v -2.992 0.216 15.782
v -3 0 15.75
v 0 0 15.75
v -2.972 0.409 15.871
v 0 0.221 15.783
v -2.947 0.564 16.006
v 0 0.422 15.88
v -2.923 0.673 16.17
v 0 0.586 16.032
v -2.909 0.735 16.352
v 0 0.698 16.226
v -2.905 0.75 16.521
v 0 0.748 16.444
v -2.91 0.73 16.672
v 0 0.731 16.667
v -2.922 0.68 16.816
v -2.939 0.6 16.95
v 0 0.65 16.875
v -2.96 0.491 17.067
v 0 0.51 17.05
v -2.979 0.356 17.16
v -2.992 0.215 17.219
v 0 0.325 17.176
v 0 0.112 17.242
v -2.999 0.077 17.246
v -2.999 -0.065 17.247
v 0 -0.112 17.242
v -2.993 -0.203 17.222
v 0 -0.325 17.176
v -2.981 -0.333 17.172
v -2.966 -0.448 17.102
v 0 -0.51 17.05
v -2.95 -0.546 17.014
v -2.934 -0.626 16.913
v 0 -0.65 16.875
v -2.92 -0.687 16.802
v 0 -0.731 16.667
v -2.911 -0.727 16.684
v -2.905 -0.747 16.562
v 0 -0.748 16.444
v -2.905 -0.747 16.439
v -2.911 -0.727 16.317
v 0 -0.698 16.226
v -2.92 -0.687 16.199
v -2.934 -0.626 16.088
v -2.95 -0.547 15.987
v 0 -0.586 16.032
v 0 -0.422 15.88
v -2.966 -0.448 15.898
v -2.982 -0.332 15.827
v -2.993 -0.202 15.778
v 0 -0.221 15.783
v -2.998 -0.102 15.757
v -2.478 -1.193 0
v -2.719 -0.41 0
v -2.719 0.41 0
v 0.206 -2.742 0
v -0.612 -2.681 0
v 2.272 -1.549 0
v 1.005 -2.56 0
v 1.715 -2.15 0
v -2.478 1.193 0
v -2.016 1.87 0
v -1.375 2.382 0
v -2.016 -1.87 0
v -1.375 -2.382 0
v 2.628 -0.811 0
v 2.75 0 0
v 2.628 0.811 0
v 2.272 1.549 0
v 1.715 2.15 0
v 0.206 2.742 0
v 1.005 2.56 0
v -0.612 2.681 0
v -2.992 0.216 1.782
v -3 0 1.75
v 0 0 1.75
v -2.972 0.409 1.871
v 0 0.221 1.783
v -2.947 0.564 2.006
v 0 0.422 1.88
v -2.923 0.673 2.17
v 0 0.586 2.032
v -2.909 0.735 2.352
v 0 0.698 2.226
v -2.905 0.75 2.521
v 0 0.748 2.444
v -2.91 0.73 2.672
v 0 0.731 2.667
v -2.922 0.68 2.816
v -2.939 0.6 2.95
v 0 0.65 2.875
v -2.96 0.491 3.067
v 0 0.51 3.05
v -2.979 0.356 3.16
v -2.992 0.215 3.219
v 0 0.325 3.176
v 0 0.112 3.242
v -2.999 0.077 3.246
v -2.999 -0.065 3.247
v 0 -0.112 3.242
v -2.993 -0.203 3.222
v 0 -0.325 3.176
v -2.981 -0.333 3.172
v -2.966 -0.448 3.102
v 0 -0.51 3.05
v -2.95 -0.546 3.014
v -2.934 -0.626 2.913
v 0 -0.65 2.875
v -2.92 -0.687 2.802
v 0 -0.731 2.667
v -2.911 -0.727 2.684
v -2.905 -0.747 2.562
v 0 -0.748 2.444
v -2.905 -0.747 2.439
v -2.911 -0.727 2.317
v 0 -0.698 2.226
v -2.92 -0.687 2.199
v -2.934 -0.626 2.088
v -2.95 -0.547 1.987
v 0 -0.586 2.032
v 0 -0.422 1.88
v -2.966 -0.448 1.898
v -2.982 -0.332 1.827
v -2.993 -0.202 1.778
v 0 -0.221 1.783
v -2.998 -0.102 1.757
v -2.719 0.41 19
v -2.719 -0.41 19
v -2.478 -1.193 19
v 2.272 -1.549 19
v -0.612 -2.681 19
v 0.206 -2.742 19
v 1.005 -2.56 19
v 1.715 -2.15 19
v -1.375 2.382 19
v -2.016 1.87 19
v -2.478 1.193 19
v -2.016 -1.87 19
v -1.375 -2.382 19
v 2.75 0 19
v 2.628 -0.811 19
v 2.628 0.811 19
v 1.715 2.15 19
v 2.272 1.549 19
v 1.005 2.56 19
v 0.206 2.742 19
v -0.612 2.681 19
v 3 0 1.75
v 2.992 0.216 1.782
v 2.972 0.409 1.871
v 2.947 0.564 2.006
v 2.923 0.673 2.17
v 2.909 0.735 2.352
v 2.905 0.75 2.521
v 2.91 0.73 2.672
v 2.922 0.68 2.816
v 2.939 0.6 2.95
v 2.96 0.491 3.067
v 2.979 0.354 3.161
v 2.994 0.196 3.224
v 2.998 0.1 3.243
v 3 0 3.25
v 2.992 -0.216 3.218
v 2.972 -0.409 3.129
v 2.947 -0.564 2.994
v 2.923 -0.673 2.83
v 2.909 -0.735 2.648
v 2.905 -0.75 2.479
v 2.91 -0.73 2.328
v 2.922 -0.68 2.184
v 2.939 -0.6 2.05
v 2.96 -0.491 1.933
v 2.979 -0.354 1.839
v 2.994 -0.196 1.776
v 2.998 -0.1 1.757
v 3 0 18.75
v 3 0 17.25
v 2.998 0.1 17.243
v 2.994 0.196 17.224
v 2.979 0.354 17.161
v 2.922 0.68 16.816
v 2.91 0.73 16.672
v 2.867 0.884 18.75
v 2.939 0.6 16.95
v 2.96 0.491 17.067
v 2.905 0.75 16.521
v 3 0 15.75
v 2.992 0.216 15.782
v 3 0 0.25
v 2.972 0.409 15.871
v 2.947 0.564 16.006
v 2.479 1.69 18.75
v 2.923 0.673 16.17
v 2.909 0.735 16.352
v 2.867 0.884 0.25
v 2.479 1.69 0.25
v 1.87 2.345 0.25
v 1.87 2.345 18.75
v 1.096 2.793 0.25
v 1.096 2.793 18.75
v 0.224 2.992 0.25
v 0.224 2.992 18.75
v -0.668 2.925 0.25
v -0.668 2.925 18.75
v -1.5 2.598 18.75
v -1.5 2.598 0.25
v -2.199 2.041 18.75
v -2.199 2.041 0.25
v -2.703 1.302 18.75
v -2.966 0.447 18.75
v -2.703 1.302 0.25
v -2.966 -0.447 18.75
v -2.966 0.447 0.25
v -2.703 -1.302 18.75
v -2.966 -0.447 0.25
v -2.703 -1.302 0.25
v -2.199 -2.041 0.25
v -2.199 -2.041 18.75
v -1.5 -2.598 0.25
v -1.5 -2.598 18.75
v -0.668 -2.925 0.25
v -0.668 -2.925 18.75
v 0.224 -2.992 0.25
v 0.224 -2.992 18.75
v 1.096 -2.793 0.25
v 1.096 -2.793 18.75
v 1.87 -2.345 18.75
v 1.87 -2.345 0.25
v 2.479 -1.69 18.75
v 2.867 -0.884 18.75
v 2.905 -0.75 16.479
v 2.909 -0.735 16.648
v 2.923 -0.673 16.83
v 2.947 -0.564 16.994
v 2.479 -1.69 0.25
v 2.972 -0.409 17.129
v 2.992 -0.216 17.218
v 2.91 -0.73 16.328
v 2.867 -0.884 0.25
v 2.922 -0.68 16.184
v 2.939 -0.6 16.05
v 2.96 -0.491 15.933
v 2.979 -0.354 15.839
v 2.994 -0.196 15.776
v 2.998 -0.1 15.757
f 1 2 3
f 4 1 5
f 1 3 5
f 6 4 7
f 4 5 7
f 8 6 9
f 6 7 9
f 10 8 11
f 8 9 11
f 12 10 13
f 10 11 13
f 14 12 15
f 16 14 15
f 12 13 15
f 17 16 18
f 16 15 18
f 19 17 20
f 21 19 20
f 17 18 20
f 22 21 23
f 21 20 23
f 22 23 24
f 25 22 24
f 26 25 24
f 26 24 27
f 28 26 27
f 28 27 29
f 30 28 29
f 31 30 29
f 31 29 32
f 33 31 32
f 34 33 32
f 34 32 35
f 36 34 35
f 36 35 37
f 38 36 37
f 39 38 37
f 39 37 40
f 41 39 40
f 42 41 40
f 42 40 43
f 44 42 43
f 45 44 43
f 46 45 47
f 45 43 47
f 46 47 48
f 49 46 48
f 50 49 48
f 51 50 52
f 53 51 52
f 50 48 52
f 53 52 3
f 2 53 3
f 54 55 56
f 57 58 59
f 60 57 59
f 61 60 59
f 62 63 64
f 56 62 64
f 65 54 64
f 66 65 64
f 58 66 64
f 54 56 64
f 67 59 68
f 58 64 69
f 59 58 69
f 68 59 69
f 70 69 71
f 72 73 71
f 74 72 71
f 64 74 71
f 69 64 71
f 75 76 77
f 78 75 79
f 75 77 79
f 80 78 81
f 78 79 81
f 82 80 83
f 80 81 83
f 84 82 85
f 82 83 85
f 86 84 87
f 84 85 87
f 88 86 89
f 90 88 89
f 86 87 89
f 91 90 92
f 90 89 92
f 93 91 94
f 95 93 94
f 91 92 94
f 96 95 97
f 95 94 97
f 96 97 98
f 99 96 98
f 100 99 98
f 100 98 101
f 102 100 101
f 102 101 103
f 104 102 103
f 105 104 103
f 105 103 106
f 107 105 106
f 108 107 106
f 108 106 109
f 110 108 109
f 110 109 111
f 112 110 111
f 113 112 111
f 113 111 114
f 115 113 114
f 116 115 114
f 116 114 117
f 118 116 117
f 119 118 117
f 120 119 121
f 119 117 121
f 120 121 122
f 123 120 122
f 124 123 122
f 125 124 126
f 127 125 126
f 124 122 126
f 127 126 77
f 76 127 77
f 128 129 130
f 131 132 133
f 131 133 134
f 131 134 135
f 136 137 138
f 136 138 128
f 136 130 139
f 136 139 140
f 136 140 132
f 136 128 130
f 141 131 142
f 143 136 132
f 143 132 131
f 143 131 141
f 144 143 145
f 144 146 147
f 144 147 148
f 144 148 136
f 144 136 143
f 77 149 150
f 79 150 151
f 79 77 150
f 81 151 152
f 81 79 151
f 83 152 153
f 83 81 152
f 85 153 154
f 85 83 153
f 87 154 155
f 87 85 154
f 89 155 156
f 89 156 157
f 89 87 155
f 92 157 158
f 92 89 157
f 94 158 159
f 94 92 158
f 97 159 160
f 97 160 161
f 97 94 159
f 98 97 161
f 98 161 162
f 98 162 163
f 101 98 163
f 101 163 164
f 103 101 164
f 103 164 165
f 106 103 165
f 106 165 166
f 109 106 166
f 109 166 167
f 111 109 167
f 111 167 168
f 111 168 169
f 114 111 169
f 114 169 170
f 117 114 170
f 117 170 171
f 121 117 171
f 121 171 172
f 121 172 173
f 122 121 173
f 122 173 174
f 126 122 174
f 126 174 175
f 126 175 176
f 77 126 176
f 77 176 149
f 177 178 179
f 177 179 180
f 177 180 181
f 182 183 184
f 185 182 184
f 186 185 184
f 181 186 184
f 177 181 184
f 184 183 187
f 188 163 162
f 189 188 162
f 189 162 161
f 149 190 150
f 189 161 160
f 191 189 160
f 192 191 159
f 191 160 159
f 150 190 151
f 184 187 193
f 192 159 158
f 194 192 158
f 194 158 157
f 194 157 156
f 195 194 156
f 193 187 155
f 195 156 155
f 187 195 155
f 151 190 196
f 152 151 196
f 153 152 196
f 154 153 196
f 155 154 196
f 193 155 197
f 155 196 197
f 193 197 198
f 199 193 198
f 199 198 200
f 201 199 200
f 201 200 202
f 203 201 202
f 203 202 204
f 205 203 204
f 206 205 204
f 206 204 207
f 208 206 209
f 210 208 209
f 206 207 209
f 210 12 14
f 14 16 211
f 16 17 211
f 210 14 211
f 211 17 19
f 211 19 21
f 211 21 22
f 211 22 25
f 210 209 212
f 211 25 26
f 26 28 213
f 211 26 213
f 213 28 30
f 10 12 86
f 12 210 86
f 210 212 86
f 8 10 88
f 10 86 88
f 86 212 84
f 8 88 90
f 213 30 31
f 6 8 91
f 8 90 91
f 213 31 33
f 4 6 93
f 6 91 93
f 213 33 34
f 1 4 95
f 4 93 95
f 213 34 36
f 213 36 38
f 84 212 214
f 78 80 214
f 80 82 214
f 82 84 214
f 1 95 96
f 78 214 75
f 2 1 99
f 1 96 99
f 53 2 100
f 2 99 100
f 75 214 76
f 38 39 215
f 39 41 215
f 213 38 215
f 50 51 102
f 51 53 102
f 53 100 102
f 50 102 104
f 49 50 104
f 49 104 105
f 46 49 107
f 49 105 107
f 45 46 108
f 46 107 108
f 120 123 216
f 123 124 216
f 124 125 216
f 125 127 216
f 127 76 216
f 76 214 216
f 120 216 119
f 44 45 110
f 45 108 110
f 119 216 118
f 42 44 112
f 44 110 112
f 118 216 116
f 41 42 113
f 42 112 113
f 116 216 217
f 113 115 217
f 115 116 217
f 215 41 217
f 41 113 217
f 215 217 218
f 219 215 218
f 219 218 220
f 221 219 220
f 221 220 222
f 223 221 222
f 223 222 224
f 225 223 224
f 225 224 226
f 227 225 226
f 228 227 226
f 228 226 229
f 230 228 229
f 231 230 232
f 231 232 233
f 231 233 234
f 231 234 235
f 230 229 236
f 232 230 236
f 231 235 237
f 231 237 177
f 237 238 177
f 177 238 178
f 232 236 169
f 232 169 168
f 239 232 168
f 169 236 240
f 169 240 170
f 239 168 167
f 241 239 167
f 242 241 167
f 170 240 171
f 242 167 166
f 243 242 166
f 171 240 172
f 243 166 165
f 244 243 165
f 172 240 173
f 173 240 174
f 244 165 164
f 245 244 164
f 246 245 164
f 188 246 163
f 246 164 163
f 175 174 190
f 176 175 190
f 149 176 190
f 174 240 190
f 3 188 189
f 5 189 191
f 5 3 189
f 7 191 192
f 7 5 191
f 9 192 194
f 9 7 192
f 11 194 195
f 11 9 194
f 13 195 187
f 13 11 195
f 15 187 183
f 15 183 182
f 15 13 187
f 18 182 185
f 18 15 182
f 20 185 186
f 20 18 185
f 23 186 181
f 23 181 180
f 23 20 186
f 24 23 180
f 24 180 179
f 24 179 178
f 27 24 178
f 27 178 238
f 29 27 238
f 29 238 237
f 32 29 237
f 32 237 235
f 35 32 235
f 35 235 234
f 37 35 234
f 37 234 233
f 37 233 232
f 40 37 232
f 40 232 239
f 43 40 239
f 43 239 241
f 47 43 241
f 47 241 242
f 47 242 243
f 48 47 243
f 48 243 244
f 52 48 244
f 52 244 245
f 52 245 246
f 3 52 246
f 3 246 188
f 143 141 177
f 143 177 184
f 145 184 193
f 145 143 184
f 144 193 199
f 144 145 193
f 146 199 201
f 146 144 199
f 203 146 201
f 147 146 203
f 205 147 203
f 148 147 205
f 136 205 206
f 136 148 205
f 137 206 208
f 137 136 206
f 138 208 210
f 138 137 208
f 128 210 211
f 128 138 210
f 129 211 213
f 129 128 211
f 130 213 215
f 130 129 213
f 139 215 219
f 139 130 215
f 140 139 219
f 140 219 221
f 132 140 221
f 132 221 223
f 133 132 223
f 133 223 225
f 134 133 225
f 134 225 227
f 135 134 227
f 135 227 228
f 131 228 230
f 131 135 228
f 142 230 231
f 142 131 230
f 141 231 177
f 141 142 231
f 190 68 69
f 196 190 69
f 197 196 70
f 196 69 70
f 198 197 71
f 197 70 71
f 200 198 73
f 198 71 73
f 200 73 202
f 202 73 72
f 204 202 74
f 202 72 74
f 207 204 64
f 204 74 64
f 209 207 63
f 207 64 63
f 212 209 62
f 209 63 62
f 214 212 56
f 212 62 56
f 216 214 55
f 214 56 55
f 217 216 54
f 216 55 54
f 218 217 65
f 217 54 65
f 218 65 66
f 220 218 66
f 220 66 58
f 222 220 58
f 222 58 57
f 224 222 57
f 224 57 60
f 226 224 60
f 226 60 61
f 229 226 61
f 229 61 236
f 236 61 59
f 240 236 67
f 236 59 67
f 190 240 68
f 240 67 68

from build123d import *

# Parameters (mm, degrees)
SKETCH3_R               = 3
BOSS_EXTRUDE1_DEPTH     = 19
SKETCH4_R               = 0.75
CUT_EXTRUDE1_DEPTH      = 4
CUT_EXTRUDE1_DEPTH_BACK = 4
CHAMFER1_SIZE           = 0.25


with BuildPart() as part:
    # Sketch3 → Boss-Extrude1 (new body)
    with BuildSketch(Plane.XY):
        Circle(SKETCH3_R)
    extrude(amount=BOSS_EXTRUDE1_DEPTH)

    # Sketch4 → Cut-Extrude1 (cut, two sides)
    with BuildSketch(Plane(origin=(0, 0, 0), x_dir=(0, 0, -1), z_dir=(1, 0, 0))) as cut_extrude1_sk:
        with Locations((-2.5, 0)):
            Circle(SKETCH4_R)
        with Locations((-16.5, 0)):
            Circle(SKETCH4_R)
    extrude(amount=CUT_EXTRUDE1_DEPTH, mode=Mode.SUBTRACT)
    extrude(cut_extrude1_sk.sketch, amount=-CUT_EXTRUDE1_DEPTH_BACK, mode=Mode.SUBTRACT)

    # Chamfer1
    chamfer1_edges = [part.edges().sort_by_distance(p)[0] for p in [
        (-3, 0, 0),
        (-3, 0, 19),
    ]]
    chamfer(chamfer1_edges, length=CHAMFER1_SIZE)


solid = part.part
